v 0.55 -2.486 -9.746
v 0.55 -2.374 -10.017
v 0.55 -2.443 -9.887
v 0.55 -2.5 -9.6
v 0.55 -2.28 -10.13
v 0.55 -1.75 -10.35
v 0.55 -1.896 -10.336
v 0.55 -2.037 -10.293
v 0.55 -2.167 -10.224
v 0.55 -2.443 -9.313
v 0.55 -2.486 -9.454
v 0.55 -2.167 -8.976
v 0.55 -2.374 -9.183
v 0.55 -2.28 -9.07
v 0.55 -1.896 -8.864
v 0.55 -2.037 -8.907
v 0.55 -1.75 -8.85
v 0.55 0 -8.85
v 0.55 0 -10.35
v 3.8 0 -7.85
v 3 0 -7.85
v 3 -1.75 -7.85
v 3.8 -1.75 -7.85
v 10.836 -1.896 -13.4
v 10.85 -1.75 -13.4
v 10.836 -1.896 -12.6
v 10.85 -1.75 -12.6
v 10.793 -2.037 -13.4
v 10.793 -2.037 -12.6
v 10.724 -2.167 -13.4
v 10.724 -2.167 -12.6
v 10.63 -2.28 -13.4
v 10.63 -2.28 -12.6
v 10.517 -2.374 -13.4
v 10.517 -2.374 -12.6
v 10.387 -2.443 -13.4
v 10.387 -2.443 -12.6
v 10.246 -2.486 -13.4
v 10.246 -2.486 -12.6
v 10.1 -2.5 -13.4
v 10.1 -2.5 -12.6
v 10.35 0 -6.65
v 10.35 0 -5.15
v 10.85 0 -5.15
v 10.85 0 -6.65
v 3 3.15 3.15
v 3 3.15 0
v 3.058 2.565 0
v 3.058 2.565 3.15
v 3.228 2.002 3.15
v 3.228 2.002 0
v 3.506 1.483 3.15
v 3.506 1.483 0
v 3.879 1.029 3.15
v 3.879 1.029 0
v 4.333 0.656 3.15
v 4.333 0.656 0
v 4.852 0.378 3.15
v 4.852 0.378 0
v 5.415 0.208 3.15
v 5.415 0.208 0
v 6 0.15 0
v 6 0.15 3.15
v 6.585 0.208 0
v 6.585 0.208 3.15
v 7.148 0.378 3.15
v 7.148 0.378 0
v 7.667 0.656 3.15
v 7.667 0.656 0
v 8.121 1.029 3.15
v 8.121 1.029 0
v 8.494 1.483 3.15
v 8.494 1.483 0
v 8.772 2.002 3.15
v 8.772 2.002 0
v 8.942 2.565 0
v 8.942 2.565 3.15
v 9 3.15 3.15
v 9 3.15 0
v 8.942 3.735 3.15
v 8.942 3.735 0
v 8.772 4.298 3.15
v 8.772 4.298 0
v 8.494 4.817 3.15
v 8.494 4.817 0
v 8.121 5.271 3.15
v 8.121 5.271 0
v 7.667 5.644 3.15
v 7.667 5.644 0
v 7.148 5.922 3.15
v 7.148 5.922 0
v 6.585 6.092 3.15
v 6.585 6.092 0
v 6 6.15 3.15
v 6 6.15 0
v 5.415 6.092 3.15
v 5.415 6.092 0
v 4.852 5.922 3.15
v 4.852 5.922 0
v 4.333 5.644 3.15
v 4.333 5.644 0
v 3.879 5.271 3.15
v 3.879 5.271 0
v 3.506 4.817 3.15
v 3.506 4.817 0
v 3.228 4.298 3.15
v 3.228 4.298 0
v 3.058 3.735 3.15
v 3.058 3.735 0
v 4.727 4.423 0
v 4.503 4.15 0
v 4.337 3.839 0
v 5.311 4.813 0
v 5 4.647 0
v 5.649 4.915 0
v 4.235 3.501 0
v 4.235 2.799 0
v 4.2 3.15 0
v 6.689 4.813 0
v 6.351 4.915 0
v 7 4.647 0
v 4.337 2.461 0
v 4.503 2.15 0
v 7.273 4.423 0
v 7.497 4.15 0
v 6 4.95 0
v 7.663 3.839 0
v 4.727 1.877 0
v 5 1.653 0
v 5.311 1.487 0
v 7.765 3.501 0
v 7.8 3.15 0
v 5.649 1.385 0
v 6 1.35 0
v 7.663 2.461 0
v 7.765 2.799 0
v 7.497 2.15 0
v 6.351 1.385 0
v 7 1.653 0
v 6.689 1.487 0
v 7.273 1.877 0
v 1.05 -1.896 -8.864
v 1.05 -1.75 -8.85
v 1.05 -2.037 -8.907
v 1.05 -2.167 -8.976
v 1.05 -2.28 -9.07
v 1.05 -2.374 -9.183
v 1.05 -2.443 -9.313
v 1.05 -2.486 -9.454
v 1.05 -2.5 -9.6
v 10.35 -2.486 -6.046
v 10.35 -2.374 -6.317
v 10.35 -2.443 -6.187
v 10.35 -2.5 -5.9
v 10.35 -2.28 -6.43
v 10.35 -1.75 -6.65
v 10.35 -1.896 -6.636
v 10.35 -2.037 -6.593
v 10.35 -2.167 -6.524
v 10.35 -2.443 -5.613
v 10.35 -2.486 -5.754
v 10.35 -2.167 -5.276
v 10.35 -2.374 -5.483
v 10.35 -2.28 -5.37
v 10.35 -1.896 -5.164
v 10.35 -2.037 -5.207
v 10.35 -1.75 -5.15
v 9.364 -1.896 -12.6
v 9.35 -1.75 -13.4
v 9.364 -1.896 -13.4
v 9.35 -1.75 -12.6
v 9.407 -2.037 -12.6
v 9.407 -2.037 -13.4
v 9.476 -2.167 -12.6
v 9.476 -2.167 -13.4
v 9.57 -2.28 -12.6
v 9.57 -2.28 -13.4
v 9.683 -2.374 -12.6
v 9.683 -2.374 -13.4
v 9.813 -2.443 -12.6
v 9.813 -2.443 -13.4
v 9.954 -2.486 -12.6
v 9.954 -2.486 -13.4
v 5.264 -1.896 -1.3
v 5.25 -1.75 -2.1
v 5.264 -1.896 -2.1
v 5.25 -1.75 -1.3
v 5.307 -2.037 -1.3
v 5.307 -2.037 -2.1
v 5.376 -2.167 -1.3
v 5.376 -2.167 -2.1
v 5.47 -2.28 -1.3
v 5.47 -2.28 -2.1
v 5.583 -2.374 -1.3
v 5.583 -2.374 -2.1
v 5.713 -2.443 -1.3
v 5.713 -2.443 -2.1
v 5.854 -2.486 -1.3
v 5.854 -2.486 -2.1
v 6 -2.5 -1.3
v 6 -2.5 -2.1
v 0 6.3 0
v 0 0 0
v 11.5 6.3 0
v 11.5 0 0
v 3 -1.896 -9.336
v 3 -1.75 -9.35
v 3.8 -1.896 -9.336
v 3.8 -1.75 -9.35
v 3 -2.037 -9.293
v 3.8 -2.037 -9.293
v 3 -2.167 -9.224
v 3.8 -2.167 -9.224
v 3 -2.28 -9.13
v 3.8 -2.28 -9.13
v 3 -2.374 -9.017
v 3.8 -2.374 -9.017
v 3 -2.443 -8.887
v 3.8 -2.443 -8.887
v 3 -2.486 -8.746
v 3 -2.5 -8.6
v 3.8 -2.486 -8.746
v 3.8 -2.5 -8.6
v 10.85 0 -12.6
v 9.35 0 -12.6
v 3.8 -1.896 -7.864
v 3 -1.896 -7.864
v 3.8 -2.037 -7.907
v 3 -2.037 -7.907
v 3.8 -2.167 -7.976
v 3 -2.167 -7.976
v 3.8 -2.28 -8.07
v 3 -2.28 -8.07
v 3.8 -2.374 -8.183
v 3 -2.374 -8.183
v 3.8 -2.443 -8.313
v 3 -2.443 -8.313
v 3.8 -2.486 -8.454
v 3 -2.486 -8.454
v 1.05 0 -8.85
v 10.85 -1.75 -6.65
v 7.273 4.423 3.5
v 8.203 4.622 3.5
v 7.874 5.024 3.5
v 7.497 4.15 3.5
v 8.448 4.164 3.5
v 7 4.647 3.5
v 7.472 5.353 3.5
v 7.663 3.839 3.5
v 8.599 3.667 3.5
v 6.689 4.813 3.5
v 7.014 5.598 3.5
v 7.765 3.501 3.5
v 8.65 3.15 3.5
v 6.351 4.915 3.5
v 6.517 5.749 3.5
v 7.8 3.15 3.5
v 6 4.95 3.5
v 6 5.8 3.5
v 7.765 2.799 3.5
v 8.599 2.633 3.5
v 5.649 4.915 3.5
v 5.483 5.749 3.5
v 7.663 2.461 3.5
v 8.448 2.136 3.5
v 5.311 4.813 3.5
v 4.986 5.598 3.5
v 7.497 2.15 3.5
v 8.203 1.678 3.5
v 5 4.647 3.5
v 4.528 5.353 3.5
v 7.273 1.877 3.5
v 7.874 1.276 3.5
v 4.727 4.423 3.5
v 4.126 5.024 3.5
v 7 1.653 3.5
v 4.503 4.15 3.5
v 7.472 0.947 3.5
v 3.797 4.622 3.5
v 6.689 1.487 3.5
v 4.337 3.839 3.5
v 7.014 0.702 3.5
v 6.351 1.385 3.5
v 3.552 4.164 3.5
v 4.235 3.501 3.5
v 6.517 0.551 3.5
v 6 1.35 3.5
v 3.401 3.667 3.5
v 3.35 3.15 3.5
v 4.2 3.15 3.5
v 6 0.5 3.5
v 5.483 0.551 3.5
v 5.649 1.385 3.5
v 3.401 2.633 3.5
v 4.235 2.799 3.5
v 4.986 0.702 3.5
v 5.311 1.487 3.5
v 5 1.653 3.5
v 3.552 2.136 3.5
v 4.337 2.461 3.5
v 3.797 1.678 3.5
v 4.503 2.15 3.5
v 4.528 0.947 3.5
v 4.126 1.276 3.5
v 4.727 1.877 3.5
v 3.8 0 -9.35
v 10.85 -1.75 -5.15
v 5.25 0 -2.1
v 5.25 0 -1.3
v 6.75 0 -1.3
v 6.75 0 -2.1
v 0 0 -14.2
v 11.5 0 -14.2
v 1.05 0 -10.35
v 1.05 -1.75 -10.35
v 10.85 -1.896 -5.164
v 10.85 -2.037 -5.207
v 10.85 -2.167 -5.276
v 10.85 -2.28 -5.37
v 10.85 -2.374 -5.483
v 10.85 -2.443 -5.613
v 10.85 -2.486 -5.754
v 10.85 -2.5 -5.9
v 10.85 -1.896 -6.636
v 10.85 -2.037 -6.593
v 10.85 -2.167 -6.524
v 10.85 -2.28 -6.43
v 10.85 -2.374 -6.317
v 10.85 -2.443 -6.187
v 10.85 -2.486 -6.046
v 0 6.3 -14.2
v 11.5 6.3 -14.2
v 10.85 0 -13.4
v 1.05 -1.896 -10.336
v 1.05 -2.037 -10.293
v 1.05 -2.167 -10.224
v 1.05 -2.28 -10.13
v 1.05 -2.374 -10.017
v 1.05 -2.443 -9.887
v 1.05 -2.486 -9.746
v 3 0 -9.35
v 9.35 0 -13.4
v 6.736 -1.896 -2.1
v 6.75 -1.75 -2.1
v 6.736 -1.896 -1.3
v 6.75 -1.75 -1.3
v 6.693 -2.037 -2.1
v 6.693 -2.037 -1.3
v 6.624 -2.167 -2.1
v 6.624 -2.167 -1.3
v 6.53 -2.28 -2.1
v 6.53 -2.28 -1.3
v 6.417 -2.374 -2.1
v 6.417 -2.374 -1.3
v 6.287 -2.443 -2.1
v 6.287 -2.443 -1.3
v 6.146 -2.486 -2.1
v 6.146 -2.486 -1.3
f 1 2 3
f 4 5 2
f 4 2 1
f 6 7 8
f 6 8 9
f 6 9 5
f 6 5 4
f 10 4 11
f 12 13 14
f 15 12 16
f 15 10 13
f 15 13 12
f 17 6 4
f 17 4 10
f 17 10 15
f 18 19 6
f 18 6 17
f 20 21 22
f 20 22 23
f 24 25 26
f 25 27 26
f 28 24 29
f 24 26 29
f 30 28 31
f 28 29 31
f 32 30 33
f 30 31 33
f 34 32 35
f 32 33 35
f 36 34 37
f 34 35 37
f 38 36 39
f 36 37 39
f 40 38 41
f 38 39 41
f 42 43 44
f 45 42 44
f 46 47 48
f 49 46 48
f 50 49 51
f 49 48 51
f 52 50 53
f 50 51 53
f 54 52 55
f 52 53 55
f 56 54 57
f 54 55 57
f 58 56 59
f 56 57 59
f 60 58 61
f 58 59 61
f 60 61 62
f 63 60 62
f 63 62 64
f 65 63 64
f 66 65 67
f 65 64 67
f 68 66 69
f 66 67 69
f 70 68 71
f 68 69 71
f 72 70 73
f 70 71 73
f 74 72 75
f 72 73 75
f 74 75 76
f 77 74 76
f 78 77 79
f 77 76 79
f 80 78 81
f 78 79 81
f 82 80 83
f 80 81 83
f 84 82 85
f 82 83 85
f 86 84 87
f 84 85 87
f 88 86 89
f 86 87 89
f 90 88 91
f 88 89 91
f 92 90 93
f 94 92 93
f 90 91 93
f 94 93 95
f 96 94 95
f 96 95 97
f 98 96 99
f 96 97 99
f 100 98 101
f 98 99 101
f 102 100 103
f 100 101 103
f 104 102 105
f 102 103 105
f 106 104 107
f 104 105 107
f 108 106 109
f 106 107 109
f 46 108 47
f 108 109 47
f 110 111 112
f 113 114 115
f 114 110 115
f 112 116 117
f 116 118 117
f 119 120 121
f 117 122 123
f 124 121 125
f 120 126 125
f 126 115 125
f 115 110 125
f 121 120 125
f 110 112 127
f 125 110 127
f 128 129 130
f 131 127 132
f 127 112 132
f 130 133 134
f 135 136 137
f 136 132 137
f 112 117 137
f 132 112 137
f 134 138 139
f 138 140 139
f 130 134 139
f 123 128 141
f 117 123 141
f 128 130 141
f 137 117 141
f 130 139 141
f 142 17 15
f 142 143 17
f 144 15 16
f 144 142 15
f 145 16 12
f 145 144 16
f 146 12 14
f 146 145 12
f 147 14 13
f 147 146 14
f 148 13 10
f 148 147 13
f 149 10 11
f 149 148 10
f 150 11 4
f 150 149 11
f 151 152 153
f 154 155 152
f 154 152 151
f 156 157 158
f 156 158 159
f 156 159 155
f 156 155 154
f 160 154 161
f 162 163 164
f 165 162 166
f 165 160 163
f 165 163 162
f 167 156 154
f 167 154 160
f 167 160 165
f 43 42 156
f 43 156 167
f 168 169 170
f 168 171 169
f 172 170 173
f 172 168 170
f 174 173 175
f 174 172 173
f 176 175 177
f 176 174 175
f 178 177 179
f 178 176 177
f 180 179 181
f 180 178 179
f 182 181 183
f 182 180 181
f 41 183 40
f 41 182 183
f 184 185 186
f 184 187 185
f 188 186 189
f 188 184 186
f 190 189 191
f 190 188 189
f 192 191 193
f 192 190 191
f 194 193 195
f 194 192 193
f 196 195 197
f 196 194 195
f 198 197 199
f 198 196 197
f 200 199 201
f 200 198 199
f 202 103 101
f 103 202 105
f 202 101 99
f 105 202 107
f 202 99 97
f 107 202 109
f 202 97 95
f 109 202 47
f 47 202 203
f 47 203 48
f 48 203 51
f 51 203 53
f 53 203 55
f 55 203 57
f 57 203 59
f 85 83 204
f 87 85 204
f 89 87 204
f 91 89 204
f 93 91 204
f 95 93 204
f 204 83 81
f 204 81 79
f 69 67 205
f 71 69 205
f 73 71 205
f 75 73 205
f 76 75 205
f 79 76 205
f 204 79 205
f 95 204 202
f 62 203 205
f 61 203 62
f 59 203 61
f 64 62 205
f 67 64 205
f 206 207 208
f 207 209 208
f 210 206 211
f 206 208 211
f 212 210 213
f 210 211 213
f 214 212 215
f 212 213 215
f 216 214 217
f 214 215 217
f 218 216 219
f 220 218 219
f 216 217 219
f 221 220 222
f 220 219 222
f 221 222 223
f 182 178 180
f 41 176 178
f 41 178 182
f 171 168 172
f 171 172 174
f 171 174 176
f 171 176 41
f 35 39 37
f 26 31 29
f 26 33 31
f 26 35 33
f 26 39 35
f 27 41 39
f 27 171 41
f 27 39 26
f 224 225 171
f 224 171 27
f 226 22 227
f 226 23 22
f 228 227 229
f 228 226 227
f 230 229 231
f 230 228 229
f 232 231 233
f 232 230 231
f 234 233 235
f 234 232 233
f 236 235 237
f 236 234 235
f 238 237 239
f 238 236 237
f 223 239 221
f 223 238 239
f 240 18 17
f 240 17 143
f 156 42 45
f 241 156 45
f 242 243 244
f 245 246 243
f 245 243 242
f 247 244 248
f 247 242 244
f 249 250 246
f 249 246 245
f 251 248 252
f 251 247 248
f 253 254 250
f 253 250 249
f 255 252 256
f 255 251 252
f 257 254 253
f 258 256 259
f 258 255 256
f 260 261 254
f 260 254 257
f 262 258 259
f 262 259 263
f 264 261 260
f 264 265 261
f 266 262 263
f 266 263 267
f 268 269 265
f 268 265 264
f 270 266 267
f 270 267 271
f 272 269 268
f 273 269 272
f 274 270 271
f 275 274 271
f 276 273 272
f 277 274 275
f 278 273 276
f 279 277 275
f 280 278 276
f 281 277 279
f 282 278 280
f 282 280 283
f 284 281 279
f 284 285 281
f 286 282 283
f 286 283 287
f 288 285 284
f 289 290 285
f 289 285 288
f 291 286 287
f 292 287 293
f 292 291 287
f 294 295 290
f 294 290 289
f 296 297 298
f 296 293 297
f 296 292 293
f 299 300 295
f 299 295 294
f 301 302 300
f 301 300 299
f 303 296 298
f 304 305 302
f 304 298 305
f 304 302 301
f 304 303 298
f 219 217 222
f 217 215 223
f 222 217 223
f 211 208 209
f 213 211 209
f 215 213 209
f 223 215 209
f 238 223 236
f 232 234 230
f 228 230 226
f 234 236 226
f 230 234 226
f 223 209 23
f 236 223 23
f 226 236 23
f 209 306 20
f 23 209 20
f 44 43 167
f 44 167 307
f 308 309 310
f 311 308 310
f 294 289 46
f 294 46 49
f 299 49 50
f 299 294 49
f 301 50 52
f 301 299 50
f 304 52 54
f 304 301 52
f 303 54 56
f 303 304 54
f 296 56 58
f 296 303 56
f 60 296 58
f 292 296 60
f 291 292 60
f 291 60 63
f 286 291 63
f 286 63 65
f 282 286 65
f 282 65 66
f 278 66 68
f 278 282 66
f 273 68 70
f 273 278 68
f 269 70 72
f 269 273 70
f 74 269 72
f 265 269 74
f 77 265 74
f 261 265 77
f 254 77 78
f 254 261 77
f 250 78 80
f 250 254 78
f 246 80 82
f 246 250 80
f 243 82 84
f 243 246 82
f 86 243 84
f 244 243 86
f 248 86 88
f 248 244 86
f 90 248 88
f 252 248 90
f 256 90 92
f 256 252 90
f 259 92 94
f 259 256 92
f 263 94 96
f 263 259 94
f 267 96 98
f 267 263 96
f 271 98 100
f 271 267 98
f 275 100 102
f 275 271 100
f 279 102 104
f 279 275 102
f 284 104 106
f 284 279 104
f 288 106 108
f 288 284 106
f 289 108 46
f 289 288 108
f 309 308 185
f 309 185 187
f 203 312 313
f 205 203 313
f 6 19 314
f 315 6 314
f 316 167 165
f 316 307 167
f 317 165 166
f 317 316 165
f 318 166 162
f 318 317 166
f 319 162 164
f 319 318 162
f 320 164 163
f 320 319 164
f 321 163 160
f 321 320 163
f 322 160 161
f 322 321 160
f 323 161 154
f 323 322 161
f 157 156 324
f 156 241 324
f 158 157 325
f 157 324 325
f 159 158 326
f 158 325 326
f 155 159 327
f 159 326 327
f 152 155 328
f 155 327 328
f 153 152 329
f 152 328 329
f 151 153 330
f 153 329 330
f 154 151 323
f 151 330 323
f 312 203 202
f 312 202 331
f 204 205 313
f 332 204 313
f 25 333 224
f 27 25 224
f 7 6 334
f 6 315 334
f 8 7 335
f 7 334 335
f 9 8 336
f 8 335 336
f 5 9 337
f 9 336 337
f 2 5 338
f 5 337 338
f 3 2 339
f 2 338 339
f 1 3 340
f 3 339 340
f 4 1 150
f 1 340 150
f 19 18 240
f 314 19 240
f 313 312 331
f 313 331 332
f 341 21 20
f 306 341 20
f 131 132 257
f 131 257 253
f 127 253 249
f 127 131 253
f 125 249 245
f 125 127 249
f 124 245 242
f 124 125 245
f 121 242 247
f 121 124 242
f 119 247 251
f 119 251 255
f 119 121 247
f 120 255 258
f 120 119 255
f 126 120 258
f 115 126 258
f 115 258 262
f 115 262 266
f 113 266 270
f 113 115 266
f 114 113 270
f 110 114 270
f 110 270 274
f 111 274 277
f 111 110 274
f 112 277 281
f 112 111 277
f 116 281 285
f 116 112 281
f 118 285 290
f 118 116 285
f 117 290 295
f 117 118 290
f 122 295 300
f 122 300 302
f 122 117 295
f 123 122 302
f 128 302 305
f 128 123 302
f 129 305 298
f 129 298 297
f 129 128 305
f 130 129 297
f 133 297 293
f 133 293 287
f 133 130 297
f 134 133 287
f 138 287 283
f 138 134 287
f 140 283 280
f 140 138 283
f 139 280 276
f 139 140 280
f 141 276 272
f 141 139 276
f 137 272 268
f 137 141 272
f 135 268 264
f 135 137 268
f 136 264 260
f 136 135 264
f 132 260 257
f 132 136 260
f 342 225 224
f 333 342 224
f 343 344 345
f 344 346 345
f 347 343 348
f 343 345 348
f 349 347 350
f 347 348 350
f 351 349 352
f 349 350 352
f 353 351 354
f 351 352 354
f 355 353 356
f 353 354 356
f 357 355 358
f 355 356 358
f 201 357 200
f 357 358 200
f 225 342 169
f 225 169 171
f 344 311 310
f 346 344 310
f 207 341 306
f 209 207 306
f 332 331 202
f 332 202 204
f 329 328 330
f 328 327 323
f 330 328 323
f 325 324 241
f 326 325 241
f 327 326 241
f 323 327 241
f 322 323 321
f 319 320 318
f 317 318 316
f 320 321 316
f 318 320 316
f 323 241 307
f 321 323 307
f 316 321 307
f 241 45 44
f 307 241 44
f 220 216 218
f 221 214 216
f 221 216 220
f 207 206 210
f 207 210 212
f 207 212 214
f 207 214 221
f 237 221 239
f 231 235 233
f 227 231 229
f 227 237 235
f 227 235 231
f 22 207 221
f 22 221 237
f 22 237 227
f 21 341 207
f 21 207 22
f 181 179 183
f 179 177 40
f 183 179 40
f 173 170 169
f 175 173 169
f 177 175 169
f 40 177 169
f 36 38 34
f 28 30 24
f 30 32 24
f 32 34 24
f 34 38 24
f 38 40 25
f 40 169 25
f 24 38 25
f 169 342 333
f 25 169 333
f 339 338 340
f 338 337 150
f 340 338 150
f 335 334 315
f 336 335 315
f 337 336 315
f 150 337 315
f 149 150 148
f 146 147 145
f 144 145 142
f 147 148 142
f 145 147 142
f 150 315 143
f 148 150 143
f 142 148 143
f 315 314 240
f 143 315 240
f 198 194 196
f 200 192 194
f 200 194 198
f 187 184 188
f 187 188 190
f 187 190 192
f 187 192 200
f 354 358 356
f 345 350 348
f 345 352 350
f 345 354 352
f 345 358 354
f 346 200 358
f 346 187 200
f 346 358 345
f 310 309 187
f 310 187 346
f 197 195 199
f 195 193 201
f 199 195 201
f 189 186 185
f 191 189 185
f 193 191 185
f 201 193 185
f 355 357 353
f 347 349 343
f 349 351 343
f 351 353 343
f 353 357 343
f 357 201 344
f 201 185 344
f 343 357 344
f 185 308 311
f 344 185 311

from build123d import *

# Parameters (mm, degrees)
SKETCH1_W             = 11.5
SKETCH1_H             = 14.2
BOSS_EXTRUDE1_DEPTH   = 6.3
SKETCH2_R             = 3
SKETCH2_R_2           = 1.8
BOSS_EXTRUDE2_DEPTH   = 3.5
SKETCH3_W             = 1.5
SKETCH3_H             = 0.8
BOSS_EXTRUDE3_DEPTH   = 2.5
SKETCH3_W_2           = 0.8
SKETCH3_H_2           = 1.5
BOSS_EXTRUDE3_2_DEPTH = 2.5
SKETCH3_W_3           = 0.5
BOSS_EXTRUDE3_3_DEPTH = 2.5
BOSS_EXTRUDE3_4_DEPTH = 2.5
BOSS_EXTRUDE3_5_DEPTH = 2.5
FILLET1_R             = 0.75
FILLET2_R             = 0.75
FILLET3_R             = 0.75
FILLET4_R             = 0.75
FILLET5_R             = 0.75
CHAMFER1_SIZE         = 0.35


with BuildPart() as part:
    # Sketch1 → Boss-Extrude1 (new body)
    with BuildSketch(Plane(origin=(0, 0, 0), x_dir=(1, 0, 0), z_dir=(0, 1, 0))):
        with Locations((5.75, 7.1)):
            Rectangle(SKETCH1_W, SKETCH1_H)
    extrude(amount=BOSS_EXTRUDE1_DEPTH)

    # Sketch2 → Boss-Extrude2 (add)
    with BuildSketch(Plane.XY):
        with Locations(Location((6, 3.15, 0), (0, 0, 180))):
            Circle(SKETCH2_R)
        with Locations((6, 3.15)):
            Circle(SKETCH2_R_2, mode=Mode.SUBTRACT)
    extrude(amount=BOSS_EXTRUDE2_DEPTH)

    # Chamfer1
    chamfer1_edges = [part.edges().sort_by_distance(p)[0] for p in [
        (9, 3.15, 3.5),
    ]]
    chamfer(chamfer1_edges, length=CHAMFER1_SIZE)


with BuildPart() as body_2:
    # Sketch3 → Boss-Extrude3 (new body)
    with BuildSketch(Plane.XZ):
        with Locations((6, -1.7)):
            Rectangle(SKETCH3_W, SKETCH3_H)
    extrude(amount=BOSS_EXTRUDE3_DEPTH)

    # Fillet1
    fillet1_edges = [body_2.edges().sort_by_distance(p)[0] for p in [
        (6.75, -2.5, -1.7),
        (5.25, -2.5, -1.7),
    ]]
    fillet(fillet1_edges, radius=FILLET1_R - 0.0001)  # a hair under: the kernel refuses the full size


with BuildPart() as body_3:
    # Sketch3 → Boss-Extrude3 2 (new body)
    with BuildSketch(Plane.XZ):
        with Locations((3.4, -8.6)):
            Rectangle(SKETCH3_W_2, SKETCH3_H_2)
    extrude(amount=BOSS_EXTRUDE3_2_DEPTH)

    # Fillet3
    fillet3_edges = [body_3.edges().sort_by_distance(p)[0] for p in [
        (3.4, -2.5, -9.35),
        (3.4, -2.5, -7.85),
    ]]
    fillet(fillet3_edges, radius=FILLET3_R - 0.0001)  # a hair under: the kernel refuses the full size


with BuildPart() as body_4:
    # Sketch3 → Boss-Extrude3 3 (new body)
    with BuildSketch(Plane.XZ):
        with Locations((0.8, -9.6)):
            Rectangle(SKETCH3_W_3, SKETCH3_H_2)
    extrude(amount=BOSS_EXTRUDE3_3_DEPTH)

    # Fillet4
    fillet4_edges = [body_4.edges().sort_by_distance(p)[0] for p in [
        (0.8, -2.5, -10.35),
        (0.8, -2.5, -8.85),
    ]]
    fillet(fillet4_edges, radius=FILLET4_R - 0.0001)  # a hair under: the kernel refuses the full size


with BuildPart() as body_5:
    # Sketch3 → Boss-Extrude3 4 (new body)
    with BuildSketch(Plane.XZ):
        with Locations((10.6, -5.9)):
            Rectangle(SKETCH3_W_3, SKETCH3_H_2)
    extrude(amount=BOSS_EXTRUDE3_4_DEPTH)

    # Fillet2
    fillet2_edges = [body_5.edges().sort_by_distance(p)[0] for p in [
        (10.6, -2.5, -6.65),
        (10.6, -2.5, -5.15),
    ]]
    fillet(fillet2_edges, radius=FILLET2_R - 0.0001)  # a hair under: the kernel refuses the full size


with BuildPart() as body_6:
    # Sketch3 → Boss-Extrude3 5 (new body)
    with BuildSketch(Plane.XZ):
        with Locations((10.1, -13)):
            Rectangle(SKETCH3_W, SKETCH3_H)
    extrude(amount=BOSS_EXTRUDE3_5_DEPTH)

    # Fillet5
    fillet5_edges = [body_6.edges().sort_by_distance(p)[0] for p in [
        (10.85, -2.5, -13),
        (9.35, -2.5, -13),
    ]]
    fillet(fillet5_edges, radius=FILLET5_R - 0.0001)  # a hair under: the kernel refuses the full size


solid = Compound([part.part, body_2.part, body_3.part, body_4.part, body_5.part, body_6.part])
